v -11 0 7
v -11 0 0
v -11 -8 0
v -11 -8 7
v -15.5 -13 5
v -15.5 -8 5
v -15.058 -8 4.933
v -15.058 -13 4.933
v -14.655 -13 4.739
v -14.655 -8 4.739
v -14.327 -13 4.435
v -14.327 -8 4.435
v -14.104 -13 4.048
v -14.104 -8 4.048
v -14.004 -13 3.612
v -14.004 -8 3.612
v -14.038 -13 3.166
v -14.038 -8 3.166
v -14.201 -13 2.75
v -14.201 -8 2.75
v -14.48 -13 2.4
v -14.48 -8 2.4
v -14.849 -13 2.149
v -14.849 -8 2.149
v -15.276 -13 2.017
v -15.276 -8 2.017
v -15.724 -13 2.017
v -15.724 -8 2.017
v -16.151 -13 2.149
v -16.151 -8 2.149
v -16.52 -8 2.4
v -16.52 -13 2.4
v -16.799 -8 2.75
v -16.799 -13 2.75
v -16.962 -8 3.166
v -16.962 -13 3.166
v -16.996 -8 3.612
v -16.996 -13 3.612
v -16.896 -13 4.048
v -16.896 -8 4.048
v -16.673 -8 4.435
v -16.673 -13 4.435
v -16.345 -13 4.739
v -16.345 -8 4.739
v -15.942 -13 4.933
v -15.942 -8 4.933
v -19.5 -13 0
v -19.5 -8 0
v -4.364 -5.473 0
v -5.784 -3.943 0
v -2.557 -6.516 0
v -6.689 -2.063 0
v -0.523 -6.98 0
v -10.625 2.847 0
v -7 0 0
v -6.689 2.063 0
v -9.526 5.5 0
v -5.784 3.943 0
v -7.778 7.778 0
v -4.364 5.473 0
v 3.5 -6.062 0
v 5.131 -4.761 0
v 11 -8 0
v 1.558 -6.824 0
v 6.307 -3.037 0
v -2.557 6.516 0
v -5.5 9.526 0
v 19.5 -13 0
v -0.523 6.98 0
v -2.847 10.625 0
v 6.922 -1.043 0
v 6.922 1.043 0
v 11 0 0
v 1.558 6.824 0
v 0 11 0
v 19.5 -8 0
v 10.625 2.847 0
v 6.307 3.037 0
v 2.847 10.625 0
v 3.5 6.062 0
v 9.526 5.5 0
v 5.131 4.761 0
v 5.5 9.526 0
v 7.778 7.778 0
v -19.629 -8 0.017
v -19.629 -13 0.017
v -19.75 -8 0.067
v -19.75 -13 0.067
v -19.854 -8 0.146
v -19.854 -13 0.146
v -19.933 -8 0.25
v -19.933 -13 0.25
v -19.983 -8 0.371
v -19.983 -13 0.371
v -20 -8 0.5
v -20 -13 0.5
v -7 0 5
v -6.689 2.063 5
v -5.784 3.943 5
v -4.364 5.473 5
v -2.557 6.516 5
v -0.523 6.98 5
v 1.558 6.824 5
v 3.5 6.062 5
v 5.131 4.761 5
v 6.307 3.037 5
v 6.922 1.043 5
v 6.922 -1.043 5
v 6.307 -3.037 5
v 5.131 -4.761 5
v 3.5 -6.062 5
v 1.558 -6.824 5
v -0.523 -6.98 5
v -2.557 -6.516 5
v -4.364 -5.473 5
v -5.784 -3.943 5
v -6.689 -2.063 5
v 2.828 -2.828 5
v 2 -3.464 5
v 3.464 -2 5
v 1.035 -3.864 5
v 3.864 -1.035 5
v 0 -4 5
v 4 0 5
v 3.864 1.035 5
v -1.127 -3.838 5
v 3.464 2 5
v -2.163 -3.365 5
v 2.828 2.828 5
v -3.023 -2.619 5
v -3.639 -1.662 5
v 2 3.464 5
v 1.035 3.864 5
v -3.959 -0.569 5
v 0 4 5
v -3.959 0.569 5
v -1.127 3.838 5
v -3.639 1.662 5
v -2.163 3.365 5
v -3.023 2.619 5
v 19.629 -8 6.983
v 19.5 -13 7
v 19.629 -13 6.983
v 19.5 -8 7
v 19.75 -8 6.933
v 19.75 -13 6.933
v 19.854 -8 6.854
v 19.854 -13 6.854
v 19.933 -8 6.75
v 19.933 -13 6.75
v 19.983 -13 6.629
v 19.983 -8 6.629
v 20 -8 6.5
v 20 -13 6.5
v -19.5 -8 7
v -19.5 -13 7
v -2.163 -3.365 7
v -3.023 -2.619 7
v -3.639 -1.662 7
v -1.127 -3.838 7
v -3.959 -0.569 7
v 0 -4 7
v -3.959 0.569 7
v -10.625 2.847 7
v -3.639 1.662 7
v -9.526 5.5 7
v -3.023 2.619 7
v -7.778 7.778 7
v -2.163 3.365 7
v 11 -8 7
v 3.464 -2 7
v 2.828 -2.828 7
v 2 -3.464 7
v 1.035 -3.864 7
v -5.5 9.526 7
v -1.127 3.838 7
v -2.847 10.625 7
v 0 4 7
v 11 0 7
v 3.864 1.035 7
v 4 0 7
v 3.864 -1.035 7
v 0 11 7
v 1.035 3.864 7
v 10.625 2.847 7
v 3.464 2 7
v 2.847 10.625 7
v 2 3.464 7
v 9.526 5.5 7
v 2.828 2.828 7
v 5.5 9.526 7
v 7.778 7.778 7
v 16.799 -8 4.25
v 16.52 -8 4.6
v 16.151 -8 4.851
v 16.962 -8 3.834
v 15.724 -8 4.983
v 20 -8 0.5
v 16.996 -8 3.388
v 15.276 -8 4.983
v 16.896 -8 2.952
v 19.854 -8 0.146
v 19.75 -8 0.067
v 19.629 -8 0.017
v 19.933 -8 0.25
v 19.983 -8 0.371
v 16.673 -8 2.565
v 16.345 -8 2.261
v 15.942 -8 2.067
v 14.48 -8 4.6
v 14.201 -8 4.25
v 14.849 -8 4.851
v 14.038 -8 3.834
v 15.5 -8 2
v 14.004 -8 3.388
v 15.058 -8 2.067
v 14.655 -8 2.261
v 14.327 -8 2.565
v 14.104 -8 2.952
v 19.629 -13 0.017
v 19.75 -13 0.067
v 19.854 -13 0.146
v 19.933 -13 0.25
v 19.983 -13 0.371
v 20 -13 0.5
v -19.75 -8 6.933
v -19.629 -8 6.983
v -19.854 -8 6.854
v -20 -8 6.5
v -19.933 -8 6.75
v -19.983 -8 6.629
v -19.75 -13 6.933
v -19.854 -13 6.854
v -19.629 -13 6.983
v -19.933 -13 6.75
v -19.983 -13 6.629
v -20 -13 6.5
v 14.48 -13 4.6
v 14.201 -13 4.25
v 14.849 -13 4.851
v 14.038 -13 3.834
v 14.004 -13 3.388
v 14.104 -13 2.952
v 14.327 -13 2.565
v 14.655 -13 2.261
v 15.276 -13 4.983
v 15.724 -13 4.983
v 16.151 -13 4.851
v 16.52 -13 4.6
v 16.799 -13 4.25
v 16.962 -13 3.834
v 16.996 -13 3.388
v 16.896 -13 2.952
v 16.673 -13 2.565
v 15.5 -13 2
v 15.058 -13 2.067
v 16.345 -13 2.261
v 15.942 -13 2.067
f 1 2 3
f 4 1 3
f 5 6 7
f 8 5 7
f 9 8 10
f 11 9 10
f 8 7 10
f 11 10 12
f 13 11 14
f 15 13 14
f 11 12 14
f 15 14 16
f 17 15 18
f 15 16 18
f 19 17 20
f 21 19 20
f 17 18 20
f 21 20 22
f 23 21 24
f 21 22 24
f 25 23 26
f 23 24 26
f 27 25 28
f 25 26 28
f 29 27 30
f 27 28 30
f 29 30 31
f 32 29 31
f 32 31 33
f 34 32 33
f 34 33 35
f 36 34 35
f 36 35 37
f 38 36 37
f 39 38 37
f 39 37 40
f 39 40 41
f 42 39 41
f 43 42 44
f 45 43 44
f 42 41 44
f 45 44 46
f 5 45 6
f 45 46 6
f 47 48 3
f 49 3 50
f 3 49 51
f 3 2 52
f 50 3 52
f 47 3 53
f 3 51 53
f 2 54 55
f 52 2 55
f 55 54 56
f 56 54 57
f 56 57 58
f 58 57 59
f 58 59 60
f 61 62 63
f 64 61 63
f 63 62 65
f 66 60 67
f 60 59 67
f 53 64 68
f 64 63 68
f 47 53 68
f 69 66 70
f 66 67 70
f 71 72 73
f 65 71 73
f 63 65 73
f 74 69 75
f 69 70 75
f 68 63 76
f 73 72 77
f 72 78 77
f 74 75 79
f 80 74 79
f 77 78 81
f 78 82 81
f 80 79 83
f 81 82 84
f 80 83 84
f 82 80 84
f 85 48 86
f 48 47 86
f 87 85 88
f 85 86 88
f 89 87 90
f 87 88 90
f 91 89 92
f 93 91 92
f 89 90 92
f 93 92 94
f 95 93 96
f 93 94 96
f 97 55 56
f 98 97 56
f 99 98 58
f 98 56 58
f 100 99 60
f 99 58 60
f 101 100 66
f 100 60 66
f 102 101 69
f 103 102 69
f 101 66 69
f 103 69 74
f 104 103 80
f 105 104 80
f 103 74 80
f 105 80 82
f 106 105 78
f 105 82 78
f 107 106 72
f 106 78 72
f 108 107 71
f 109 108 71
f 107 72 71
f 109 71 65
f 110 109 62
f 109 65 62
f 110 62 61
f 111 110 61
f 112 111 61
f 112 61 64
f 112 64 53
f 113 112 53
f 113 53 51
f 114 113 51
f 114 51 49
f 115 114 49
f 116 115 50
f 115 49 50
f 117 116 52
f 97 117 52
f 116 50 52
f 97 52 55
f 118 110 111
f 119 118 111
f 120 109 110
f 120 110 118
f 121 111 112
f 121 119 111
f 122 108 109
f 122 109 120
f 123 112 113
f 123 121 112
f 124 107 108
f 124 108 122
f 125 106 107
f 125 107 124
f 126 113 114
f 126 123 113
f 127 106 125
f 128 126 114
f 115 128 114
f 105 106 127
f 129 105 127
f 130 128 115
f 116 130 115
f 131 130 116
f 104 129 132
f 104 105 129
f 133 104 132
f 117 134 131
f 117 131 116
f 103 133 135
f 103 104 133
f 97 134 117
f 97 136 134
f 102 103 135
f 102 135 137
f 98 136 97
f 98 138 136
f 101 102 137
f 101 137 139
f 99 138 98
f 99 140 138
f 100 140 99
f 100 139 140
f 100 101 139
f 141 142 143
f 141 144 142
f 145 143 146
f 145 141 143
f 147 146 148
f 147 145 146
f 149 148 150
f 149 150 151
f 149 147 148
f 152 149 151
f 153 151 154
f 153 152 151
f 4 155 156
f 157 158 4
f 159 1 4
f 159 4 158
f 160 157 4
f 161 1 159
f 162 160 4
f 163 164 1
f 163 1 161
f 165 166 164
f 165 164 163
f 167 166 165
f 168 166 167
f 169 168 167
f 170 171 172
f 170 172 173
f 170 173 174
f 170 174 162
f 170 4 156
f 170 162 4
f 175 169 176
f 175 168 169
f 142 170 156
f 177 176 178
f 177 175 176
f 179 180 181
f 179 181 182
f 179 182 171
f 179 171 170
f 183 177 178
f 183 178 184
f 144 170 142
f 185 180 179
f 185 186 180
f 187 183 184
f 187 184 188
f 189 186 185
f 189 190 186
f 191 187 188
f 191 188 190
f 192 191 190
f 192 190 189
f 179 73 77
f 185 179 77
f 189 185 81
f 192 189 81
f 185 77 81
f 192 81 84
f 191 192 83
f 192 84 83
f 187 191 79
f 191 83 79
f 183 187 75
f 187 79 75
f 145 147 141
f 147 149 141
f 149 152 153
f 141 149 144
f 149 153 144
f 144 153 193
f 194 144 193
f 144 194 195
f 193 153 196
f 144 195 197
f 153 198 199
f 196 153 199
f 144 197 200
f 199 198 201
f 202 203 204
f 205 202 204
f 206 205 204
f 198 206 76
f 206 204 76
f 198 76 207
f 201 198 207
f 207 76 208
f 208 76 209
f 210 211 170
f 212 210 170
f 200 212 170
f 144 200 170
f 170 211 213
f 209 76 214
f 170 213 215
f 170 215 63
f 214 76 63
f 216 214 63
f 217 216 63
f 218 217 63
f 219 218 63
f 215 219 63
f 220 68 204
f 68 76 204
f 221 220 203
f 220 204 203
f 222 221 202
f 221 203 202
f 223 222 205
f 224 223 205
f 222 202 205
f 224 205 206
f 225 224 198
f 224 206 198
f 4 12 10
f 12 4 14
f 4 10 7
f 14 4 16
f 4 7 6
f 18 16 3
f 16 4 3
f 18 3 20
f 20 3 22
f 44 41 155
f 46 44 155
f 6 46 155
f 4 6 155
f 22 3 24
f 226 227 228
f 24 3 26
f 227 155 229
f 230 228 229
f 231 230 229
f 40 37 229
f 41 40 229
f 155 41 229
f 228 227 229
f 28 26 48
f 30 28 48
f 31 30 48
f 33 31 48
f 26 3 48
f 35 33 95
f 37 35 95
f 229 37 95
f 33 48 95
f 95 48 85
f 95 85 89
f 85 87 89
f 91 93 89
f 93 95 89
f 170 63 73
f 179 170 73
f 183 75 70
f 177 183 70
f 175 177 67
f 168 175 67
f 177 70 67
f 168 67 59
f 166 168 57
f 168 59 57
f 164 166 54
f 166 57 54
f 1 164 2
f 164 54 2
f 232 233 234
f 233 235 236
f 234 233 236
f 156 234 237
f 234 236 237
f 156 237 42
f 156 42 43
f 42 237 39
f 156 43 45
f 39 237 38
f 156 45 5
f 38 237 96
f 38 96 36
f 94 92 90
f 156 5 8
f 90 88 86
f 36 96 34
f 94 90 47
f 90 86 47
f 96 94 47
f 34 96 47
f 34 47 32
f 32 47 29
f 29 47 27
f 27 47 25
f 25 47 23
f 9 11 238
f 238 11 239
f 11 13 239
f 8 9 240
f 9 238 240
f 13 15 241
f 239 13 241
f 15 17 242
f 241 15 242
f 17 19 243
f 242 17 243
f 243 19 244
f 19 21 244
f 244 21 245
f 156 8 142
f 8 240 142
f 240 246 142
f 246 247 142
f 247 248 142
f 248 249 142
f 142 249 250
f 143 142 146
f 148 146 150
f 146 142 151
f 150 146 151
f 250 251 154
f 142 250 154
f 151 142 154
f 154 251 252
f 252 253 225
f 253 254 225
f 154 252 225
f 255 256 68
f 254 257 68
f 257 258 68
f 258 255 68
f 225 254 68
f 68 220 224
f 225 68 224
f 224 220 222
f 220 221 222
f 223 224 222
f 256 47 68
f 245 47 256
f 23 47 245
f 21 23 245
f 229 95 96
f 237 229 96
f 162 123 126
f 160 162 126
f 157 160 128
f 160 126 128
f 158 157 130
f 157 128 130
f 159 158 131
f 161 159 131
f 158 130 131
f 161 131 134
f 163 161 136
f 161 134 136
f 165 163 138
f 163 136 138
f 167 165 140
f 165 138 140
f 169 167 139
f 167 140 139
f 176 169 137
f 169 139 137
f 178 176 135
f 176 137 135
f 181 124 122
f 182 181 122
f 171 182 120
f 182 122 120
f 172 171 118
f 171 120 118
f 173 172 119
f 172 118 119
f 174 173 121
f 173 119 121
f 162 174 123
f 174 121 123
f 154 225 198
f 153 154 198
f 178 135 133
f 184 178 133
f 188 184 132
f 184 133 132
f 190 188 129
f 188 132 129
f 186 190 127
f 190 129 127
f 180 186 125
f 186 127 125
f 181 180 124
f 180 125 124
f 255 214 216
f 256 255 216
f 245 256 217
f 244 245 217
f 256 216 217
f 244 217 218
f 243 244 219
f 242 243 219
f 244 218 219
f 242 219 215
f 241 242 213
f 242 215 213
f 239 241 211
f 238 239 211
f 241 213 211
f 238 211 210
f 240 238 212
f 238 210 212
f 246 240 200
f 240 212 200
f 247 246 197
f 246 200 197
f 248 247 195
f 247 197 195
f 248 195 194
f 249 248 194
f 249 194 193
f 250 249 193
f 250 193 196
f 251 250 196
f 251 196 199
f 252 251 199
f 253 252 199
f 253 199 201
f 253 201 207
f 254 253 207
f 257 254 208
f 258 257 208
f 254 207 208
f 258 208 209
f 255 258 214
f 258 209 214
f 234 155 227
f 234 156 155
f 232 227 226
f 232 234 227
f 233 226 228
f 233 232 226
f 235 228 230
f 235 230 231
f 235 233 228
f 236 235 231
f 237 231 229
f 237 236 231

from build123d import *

# Parameters (mm, degrees)
BOSS_EXTRUDE1_DEPTH = 7
SKETCH2_R           = 7
CUT_EXTRUDE1_DEPTH  = 5
SKETCH3_R           = 1.5
CUT_EXTRUDE2_DEPTH  = 5
FILLET1_R           = 0.5


with BuildPart() as part:
    # Sketch1 → Boss-Extrude1 (new body)
    with BuildSketch(Plane.XY):
        with BuildLine():
            ThreePointArc((0, 11), (-7.778174593, 7.778174593), (-11, 0))
            ThreePointArc((-11, 0), (-7.778174593, -7.778174593), (0, -11))
            Line((0, -11), (0, -4))
            ThreePointArc((0, -4), (-4, 0), (0, 4))
            Line((0, 4), (0, 11))
        make_face()
        with BuildLine():
            ThreePointArc((11, 0), (7.778174593, 7.778174593), (0, 11))
            Line((0, 11), (0, 4))
            ThreePointArc((0, 4), (2.828427125, 2.828427125), (4, 0))
            ThreePointArc((4, 0), (2.828427125, -2.828427125), (0, -4))
            Line((0, -4), (0, -11))
            ThreePointArc((0, -11), (7.778174593, -7.778174593), (11, 0))
        make_face()
        with BuildLine():
            ThreePointArc((0, -11), (-7.778174593, -7.778174593), (-11, 0))
            Line((-11, 0), (-11, -8))
            Line((-11, -8), (-20, -8))
            Line((-20, -8), (-20, -13))
            Line((-20, -13), (0, -13))
            Line((0, -13), (0, -11))
        make_face()
        with BuildLine():
            ThreePointArc((11, 0), (7.778174593, -7.778174593), (0, -11))
            Line((0, -11), (0, -13))
            Line((0, -13), (20, -13))
            Line((20, -13), (20, -8))
            Line((20, -8), (11, -8))
            Line((11, -8), (11, 0))
        make_face()
    extrude(amount=BOSS_EXTRUDE1_DEPTH)

    # Sketch2 → Cut-Extrude1 (cut)
    with BuildSketch(Plane(origin=(0, 0, 0), x_dir=(-1, 0, 0), z_dir=(0, 0, -1))):
        Circle(SKETCH2_R)
    extrude(amount=-CUT_EXTRUDE1_DEPTH, mode=Mode.SUBTRACT)

    # Sketch3 → Cut-Extrude2 (cut)
    with BuildSketch(Plane(origin=(0, -8, 0), x_dir=(1, 0, 0), z_dir=(0, 1, 0))):
        with Locations(Location((-15.5, -3.5, 0), (0, 0, 270))):
            Circle(SKETCH3_R)
        with Locations(Location((15.5, -3.5, 0), (0, 0, 90))):
            Circle(SKETCH3_R)
    extrude(amount=-CUT_EXTRUDE2_DEPTH, mode=Mode.SUBTRACT)

    # Fillet1
    fillet1_edges = [part.edges().sort_by_distance(p)[0] for p in [
        (20, -10.5, 7),
        (-20, -10.5, 0),
        (20, -10.5, 0),
        (-20, -10.5, 7),
    ]]
    fillet(fillet1_edges, radius=FILLET1_R)


solid = part.part
